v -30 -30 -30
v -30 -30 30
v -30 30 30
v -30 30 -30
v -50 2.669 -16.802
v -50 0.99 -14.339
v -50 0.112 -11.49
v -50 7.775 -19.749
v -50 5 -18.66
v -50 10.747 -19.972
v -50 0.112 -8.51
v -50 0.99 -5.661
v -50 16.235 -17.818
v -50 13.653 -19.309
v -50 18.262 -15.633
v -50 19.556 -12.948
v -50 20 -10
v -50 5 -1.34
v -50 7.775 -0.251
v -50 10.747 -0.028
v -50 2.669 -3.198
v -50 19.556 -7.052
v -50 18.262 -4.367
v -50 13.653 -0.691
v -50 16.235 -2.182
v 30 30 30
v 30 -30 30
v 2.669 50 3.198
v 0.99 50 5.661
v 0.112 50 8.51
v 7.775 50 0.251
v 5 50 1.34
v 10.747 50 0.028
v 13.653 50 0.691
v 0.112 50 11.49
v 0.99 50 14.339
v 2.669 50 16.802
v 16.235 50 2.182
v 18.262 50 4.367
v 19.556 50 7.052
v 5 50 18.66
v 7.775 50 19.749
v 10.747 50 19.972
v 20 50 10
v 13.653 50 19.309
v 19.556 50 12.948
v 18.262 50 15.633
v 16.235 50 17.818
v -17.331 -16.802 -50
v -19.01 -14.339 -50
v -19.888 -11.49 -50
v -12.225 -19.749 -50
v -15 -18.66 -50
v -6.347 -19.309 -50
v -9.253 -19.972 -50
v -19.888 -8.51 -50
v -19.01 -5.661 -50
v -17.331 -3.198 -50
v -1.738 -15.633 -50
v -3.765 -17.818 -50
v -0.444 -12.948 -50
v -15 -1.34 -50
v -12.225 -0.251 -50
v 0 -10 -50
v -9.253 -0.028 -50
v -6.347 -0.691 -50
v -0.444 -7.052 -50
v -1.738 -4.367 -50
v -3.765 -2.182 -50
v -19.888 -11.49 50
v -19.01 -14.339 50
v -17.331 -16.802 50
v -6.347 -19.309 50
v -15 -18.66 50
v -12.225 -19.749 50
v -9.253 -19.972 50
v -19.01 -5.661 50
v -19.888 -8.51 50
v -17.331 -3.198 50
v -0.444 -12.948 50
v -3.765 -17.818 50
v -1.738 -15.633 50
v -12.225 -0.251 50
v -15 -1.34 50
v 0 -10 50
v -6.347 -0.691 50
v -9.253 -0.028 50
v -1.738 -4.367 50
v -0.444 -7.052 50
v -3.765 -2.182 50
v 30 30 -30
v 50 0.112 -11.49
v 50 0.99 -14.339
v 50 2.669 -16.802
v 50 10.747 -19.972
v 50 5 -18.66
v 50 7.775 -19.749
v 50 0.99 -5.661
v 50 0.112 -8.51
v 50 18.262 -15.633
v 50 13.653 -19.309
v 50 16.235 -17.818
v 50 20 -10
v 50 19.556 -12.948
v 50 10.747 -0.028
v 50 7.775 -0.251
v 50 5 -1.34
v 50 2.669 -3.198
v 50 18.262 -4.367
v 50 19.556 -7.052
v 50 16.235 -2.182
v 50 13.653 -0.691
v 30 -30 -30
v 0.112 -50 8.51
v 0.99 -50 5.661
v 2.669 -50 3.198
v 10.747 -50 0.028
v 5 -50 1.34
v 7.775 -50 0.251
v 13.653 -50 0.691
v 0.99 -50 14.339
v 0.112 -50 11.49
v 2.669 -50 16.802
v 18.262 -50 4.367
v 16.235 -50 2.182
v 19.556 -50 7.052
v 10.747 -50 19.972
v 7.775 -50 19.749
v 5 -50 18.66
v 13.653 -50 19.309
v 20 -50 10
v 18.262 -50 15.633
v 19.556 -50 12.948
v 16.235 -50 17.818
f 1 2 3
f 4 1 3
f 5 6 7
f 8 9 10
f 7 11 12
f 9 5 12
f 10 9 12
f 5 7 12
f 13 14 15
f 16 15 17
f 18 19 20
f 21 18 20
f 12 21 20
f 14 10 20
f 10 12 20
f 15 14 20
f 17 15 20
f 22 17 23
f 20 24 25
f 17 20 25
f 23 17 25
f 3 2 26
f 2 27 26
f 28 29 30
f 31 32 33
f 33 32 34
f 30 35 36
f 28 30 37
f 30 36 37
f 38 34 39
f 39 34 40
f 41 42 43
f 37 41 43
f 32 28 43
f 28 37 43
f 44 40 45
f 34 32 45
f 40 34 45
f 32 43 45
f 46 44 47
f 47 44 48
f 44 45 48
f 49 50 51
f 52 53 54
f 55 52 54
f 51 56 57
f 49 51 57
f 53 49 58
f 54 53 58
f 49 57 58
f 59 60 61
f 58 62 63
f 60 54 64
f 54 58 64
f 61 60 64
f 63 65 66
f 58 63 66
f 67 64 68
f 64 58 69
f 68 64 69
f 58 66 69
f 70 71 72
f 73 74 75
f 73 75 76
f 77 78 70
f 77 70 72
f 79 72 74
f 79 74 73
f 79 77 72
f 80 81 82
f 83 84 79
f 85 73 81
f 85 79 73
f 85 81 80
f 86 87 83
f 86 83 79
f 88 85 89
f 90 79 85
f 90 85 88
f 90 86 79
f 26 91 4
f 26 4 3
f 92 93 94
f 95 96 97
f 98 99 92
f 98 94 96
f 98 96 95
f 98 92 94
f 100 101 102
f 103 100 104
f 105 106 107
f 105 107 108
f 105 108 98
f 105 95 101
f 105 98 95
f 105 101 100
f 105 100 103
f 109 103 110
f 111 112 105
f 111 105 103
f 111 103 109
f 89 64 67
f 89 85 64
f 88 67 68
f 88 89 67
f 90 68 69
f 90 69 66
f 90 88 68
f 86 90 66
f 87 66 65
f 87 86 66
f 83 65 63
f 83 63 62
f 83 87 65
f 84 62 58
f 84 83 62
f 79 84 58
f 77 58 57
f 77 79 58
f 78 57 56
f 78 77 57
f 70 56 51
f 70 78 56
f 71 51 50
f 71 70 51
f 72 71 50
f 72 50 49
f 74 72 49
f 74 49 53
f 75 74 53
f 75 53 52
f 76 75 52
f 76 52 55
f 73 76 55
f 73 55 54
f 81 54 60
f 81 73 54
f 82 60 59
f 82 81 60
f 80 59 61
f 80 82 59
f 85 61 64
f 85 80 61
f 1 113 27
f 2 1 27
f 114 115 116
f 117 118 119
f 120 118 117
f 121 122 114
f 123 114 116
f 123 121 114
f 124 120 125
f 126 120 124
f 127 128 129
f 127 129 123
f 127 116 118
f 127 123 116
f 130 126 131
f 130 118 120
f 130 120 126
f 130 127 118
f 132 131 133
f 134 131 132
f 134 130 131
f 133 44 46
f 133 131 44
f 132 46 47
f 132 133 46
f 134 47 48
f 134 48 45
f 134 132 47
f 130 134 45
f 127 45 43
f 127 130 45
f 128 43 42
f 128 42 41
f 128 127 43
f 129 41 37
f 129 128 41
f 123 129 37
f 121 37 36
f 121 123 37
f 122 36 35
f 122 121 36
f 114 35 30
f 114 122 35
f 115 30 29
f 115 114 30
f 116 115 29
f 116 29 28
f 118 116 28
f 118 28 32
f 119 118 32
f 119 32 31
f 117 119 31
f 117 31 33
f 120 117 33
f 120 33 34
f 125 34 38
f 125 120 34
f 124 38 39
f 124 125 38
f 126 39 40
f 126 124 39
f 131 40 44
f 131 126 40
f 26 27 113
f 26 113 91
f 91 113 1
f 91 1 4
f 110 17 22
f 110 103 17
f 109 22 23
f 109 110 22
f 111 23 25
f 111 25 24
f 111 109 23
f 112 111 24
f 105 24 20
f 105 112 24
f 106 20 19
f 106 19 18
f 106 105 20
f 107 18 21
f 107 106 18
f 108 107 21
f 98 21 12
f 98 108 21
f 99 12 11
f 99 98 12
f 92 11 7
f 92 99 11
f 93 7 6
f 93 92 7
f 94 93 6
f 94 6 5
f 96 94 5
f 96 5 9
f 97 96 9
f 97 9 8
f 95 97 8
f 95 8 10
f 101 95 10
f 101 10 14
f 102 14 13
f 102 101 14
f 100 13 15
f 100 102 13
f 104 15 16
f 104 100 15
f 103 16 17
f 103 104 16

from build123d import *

# Parameters (mm, degrees)
F0_R     = 10
F1_DEPTH = 50
F2_R     = 10
F3_DEPTH = 50
F4_R     = 10
F5_DEPTH = 50
F6_W     = 60
F6_H     = 60
F7_DEPTH = 30


with BuildPart() as f1:
    # F0 (on Top) → F1 (new body, symmetric)
    with BuildSketch(Plane.XY):
        with Locations((-10, -10)):
            Circle(F0_R)
    extrude(amount=F1_DEPTH, both=True)


with BuildPart() as f3:
    # F2 (on Front) → F3 (new body, symmetric)
    with BuildSketch(Plane.XZ):
        with Locations((10, 10)):
            Circle(F2_R)
    extrude(amount=F3_DEPTH, both=True)


with BuildPart() as f5:
    # F4 (on Right) → F5 (new body, symmetric)
    with BuildSketch(Plane.YZ):
        with Locations((10, -10)):
            Circle(F4_R)
    extrude(amount=F5_DEPTH, both=True)


with BuildPart() as f7:
    # F6 (on Right) → F7 (new body, symmetric)
    with BuildSketch(Plane.YZ):
        Rectangle(F6_W, F6_H)
    extrude(amount=F7_DEPTH, both=True)


solid = Compound([f1.part, f3.part, f5.part, f7.part])
